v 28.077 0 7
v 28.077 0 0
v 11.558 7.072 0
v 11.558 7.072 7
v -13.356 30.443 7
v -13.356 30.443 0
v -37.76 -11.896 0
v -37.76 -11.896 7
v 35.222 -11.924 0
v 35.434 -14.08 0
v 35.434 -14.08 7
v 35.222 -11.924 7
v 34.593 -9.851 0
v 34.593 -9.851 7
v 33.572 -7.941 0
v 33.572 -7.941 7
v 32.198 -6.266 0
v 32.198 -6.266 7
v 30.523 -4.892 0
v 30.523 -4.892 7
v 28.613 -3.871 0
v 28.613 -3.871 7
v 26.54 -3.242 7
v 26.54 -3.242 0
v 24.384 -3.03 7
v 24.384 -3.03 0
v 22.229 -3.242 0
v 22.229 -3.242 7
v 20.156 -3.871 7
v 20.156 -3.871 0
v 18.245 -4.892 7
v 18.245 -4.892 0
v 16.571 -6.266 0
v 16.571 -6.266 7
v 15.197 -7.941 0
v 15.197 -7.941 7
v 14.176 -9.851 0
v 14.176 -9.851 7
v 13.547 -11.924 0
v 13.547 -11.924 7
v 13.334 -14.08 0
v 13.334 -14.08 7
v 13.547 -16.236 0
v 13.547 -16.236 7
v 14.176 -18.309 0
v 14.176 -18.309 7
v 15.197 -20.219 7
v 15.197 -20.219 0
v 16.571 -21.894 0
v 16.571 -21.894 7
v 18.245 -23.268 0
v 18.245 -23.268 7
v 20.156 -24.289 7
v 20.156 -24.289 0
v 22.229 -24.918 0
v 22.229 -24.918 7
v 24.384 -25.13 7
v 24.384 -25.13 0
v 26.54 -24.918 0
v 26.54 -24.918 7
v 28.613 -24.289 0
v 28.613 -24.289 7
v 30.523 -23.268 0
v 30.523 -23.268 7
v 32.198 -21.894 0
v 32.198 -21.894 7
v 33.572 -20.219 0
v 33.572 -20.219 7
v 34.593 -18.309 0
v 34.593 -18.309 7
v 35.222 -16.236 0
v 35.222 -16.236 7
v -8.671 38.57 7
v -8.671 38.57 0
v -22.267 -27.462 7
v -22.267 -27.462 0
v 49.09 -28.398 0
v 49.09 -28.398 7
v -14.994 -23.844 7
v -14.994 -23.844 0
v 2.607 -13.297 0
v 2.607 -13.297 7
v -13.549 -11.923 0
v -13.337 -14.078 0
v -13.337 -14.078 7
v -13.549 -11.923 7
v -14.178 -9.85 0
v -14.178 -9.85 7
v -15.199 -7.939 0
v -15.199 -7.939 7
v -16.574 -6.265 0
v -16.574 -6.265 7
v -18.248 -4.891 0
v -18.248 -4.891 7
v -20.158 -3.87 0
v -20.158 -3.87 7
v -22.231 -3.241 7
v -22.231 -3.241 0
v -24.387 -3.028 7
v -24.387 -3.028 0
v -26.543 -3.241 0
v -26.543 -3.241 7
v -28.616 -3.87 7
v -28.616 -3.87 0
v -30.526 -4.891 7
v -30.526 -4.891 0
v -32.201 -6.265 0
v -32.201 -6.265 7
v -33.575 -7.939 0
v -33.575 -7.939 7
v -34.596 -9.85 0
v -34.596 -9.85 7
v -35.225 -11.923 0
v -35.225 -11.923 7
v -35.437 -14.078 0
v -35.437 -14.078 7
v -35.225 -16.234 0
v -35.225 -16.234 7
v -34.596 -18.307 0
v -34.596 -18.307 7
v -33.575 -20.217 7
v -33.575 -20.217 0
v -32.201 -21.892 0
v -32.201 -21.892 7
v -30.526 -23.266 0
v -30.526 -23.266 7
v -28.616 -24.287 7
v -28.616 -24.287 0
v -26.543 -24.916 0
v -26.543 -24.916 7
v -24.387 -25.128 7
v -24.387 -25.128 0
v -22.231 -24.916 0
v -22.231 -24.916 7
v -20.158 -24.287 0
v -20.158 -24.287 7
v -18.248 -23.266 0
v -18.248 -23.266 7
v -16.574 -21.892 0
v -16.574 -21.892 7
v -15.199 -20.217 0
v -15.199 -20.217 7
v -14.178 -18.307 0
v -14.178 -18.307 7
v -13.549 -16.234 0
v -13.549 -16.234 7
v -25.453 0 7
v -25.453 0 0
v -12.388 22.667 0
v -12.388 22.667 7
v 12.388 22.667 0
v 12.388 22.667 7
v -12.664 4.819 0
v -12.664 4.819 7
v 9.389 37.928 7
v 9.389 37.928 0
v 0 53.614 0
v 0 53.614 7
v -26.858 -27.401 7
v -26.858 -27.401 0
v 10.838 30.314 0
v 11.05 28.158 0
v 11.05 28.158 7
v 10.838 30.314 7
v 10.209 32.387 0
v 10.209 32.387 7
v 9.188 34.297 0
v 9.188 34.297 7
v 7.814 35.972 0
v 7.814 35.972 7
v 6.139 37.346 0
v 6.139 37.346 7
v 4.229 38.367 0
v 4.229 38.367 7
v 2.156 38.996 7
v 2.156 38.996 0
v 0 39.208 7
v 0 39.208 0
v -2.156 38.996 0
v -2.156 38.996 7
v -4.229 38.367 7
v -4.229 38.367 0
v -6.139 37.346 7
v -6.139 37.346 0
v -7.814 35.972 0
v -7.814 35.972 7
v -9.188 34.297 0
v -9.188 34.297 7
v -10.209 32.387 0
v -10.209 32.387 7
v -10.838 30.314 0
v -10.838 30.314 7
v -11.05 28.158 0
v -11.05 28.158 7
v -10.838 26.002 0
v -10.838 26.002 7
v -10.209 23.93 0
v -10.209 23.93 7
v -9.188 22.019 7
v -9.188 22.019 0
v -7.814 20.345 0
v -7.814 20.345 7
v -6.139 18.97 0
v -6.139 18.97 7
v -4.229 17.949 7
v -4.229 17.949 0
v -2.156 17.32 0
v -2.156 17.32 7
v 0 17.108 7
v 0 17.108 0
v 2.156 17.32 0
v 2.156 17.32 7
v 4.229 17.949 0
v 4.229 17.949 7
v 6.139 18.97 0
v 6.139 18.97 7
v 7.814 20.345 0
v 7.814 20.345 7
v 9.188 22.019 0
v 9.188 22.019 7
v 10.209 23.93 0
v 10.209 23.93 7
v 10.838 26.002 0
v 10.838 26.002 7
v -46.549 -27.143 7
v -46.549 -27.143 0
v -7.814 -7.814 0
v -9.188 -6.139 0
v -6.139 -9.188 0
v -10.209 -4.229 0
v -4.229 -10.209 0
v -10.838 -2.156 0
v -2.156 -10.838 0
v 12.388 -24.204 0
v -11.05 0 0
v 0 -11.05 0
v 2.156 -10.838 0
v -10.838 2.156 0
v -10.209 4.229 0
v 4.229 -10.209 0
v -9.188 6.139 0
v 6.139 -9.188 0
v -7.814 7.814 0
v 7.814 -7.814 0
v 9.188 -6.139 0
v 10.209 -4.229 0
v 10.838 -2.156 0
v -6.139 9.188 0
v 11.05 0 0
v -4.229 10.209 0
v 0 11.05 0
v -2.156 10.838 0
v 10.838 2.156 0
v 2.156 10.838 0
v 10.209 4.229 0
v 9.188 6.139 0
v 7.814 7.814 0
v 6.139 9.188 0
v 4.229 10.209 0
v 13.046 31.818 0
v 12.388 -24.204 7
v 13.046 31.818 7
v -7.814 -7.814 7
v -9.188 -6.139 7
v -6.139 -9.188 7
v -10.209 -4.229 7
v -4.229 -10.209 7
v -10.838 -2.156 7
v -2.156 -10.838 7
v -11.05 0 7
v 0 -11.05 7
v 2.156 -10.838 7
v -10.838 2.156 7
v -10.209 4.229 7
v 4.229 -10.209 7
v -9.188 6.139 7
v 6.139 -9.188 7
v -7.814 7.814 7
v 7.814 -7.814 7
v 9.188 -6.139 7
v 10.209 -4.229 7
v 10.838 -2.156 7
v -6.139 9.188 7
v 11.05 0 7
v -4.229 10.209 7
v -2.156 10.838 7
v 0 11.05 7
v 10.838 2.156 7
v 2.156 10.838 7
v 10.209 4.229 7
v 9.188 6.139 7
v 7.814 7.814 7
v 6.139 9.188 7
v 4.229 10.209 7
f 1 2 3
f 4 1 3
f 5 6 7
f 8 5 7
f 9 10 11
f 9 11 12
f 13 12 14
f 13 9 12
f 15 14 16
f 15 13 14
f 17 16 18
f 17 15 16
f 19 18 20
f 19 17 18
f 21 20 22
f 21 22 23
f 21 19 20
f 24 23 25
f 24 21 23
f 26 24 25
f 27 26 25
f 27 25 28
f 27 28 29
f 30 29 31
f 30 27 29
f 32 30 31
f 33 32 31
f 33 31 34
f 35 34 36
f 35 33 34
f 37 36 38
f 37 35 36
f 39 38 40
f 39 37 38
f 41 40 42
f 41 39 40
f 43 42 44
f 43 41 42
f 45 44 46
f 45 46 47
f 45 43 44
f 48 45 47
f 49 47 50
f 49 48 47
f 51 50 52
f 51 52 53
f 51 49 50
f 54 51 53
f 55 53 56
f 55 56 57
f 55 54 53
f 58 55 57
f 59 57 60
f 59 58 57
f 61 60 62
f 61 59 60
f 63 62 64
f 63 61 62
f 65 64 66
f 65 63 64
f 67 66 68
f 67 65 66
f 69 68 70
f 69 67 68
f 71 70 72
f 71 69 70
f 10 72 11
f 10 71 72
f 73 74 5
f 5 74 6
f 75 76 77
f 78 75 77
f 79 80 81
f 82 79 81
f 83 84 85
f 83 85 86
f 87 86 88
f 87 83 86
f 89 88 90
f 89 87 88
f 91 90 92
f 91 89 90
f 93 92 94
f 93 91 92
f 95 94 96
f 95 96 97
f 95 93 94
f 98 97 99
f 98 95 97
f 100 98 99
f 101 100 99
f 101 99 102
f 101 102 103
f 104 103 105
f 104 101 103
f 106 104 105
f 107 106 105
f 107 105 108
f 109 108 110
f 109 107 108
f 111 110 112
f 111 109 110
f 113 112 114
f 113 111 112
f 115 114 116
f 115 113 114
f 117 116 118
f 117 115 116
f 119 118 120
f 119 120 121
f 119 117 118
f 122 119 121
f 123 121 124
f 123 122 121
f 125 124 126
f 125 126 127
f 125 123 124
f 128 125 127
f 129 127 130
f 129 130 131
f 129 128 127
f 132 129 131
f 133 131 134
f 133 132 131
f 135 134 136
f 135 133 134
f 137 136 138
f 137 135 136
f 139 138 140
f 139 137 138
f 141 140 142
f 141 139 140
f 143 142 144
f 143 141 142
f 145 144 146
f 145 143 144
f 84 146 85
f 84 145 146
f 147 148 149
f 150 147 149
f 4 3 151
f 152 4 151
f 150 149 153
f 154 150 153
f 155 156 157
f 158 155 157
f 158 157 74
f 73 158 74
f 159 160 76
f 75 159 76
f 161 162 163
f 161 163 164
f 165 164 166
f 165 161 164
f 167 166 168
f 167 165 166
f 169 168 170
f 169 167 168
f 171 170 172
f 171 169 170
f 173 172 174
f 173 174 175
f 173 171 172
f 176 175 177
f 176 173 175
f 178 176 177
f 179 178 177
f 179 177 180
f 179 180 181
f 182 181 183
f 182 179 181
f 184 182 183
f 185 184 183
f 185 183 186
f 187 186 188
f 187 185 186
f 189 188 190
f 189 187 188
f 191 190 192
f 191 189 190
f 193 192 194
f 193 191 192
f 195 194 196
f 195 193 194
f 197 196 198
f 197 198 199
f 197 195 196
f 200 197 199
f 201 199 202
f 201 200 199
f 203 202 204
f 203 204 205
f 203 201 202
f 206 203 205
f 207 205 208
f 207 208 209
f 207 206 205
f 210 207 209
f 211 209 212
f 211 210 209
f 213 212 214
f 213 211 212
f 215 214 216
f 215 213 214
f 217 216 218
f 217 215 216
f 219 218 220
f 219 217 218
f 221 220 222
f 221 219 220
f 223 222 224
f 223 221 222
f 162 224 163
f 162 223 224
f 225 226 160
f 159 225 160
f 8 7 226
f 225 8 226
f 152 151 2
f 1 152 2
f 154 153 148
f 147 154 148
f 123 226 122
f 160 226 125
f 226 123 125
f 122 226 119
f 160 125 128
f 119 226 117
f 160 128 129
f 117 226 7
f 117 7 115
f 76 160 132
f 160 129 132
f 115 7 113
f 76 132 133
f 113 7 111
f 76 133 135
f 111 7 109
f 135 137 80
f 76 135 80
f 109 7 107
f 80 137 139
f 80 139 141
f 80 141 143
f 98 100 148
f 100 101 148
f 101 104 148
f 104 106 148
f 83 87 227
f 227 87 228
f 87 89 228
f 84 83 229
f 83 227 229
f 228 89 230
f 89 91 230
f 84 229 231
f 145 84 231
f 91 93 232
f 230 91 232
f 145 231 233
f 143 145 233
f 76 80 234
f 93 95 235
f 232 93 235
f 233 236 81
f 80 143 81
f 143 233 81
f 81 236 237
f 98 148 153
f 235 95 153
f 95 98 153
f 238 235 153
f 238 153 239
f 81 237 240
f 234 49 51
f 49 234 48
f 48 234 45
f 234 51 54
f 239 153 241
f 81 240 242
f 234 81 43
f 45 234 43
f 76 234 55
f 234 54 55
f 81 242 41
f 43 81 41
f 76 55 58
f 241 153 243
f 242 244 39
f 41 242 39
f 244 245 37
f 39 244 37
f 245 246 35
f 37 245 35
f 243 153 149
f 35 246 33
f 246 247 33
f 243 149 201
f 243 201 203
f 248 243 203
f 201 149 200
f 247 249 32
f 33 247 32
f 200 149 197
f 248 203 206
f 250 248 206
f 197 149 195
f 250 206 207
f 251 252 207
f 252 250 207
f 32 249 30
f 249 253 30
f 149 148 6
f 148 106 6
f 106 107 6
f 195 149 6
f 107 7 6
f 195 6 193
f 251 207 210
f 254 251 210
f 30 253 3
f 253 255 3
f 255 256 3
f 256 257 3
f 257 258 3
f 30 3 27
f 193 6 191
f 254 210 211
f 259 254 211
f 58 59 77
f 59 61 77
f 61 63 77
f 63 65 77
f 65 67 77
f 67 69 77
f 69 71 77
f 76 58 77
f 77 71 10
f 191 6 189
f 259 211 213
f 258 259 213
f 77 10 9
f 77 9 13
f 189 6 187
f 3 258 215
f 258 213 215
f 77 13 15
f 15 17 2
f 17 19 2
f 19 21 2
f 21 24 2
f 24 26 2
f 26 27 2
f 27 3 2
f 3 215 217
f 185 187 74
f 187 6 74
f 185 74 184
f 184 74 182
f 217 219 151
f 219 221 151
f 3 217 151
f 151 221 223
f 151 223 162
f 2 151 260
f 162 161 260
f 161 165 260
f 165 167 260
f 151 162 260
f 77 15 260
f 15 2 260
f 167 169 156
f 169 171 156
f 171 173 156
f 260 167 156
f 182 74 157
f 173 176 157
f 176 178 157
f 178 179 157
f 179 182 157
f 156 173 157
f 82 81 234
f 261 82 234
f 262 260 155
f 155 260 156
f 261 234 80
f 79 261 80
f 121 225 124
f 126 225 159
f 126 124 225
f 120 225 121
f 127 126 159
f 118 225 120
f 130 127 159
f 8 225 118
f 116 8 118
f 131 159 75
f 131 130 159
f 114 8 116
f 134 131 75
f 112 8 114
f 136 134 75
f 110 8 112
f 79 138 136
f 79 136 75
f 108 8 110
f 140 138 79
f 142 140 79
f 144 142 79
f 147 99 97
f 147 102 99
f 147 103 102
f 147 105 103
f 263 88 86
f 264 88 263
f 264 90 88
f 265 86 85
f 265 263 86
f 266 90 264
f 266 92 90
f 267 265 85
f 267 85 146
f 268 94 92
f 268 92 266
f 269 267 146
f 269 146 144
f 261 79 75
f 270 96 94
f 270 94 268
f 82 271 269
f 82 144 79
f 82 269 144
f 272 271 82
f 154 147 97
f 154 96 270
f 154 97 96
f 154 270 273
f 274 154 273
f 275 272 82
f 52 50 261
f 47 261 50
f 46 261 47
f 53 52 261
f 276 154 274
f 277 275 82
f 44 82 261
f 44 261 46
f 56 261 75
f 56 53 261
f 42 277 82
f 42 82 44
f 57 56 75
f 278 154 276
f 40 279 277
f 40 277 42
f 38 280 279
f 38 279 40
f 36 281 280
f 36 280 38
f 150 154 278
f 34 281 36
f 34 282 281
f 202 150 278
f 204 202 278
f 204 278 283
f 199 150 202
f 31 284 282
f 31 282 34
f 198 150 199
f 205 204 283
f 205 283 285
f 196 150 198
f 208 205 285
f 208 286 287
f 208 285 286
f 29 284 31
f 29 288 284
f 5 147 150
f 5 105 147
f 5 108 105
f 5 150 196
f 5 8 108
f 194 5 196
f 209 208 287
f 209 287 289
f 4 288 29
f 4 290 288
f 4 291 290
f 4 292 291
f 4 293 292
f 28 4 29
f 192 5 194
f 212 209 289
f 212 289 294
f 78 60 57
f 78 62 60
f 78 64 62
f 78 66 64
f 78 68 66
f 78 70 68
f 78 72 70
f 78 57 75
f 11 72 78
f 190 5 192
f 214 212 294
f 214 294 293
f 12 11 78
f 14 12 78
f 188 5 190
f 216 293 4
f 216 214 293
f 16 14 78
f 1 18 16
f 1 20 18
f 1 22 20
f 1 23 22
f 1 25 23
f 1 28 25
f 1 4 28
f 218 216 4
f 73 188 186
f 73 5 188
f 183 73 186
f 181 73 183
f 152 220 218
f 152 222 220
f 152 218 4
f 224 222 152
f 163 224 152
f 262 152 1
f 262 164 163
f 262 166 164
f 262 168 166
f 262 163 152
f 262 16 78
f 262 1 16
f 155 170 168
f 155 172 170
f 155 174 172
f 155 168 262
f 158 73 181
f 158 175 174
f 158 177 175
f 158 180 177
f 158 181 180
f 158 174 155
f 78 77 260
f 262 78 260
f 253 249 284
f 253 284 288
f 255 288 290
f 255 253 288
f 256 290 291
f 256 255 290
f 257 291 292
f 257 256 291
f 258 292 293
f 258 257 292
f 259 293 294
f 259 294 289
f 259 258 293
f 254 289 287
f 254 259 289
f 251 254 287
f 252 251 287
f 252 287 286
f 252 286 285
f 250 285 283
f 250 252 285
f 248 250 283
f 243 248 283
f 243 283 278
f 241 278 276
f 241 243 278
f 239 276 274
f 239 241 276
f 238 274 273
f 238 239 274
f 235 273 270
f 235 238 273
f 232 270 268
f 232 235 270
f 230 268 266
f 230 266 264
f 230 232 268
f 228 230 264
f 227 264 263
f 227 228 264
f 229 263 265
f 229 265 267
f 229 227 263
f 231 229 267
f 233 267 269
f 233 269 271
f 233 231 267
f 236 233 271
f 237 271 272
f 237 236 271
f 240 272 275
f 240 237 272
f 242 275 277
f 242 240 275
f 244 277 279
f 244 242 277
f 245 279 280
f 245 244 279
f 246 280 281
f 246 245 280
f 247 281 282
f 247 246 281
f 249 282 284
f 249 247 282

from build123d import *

# Parameters (mm, degrees)
F0_R     = 11.05
F0_R_2   = 13.55
F1_DEPTH = 7


with BuildPart() as f1:
    # F0 (on Top) → F1 (new body)
    with BuildSketch(Plane.XY):
        with BuildLine():
            ThreePointArc((2.6065338711, -13.2969350295), (10.4623380263, -8.6105739079), (13.55, 0))
            ThreePointArc((13.55, 0), (13.0425271945, 3.6735520114), (11.5581203867, 7.0719412559))
            ThreePointArc((11.5581203867, 7.0719412559), (-1.2547280417, 13.4917811108), (-12.6639989198, 4.8192978077))
            ThreePointArc((-12.6639989198, 4.8192978077), (-10.3603872444, -8.7329763624), (2.6065338711, -13.2969350295))
        make_face()
        Circle(F0_R, mode=Mode.SUBTRACT)
        with BuildLine():
            ThreePointArc((11.5581203867, 7.0719412559), (13.0425271945, 3.6735520114), (13.55, 0))
            ThreePointArc((13.55, 0), (10.4623380263, -8.6105739079), (2.6065338711, -13.2969350295))
            Line((2.6065338711, -13.2969350295), (12.3875978298, -24.2038302976))
            Line((12.3875978298, -24.2038302976), (-14.9941514566, -23.8444135863))
            ThreePointArc((-14.9941514566, -23.8444135863), (-18.3532690256, -26.2108119603), (-22.267239092, -27.461551912))
            Line((-22.267239092, -27.461551912), (49.0895092572, -28.3981906763))
            Line((49.0895092572, -28.3981906763), (13.0464962981, 31.8175852156))
            ThreePointArc((13.0464962981, 31.8175852156), (13.4235339021, 30.0051079331), (13.55, 28.1581543386))
            ThreePointArc((13.55, 28.1581543386), (13.2562145915, 25.351862354), (12.3875978298, 22.6672600574))
            Line((12.3875978298, 22.6672600574), (28.0773907901, 0))
            Line((28.0773907901, 0), (11.5581203867, 7.0719412559))
        make_face()
        with Locations((24.3843801233, -14.0799748264)):
            Circle(F0_R_2, mode=Mode.SUBTRACT)
        with BuildLine():
            ThreePointArc((-12.6639989198, 4.8192978077), (-1.2547280417, 13.4917811108), (11.5581203867, 7.0719412559))
            Line((11.5581203867, 7.0719412559), (12.3875978298, 22.6672600574))
            ThreePointArc((12.3875978298, 22.6672600574), (0, 14.6081543386), (-12.3875978298, 22.6672600574))
            Line((-12.3875978298, 22.6672600574), (-12.6639989198, 4.8192978077))
        make_face()
        with BuildLine():
            Line((-14.9941514566, -23.8444135863), (2.6065338711, -13.2969350295))
            ThreePointArc((2.6065338711, -13.2969350295), (-10.3603872444, -8.7329763624), (-12.6639989198, 4.8192978077))
            Line((-12.6639989198, 4.8192978077), (-25.4531481717, 0))
            Line((-25.4531481717, 0), (-12.3875978298, 22.6672600574))
            ThreePointArc((-12.3875978298, 22.6672600574), (-13.4461101823, 26.4834540771), (-13.3560221409, 30.4427051857))
            Line((-13.3560221409, 30.4427051857), (-32.9787461707, -3.600513583))
            ThreePointArc((-32.9787461707, -3.600513583), (-18.5911674875, -1.8305608799), (-10.8371028035, -14.0784028862))
            ThreePointArc((-10.8371028035, -14.0784028862), (-11.9196052449, -19.3853798623), (-14.9941514566, -23.8444135863))
        make_face()
        with BuildLine():
            ThreePointArc((-12.3875978298, 22.6672600574), (0, 14.6081543386), (12.3875978298, 22.6672600574))
            ThreePointArc((12.3875978298, 22.6672600574), (13.2562145915, 25.351862354), (13.55, 28.1581543386))
            ThreePointArc((13.55, 28.1581543386), (13.4235339021, 30.0051079331), (13.0464962981, 31.8175852156))
            Line((13.0464962981, 31.8175852156), (9.3890984881, 37.9278692567))
            ThreePointArc((9.3890984881, 37.9278692567), (0.4816570964, 41.6995909847), (-8.6712487219, 38.5702600624))
            Line((-8.6712487219, 38.5702600624), (-13.3560221409, 30.4427051857))
            ThreePointArc((-13.3560221409, 30.4427051857), (-13.4461101823, 26.4834540771), (-12.3875978298, 22.6672600574))
        make_face()
        with Locations((0, 28.1581543386)):
            Circle(F0_R, mode=Mode.SUBTRACT)
        with BuildLine():
            ThreePointArc((-22.267239092, -27.461551912), (-18.3532690256, -26.2108119603), (-14.9941514566, -23.8444135863))
            ThreePointArc((-14.9941514566, -23.8444135863), (-11.9196052449, -19.3853798623), (-10.8371028035, -14.0784028862))
            ThreePointArc((-10.8371028035, -14.0784028862), (-18.5911674875, -1.8305608799), (-32.9787461707, -3.600513583))
            Line((-32.9787461707, -3.600513583), (-37.7601482446, -11.895708306))
            ThreePointArc((-37.7601482446, -11.895708306), (-35.4713085242, -21.872174986), (-26.8575138424, -27.4012993168))
            Line((-26.8575138424, -27.4012993168), (-22.267239092, -27.461551912))
        make_face()
        with Locations((-24.3871028035, -14.0784028862)):
            Circle(F0_R, mode=Mode.SUBTRACT)
        with BuildLine():
            Line((-46.5486845968, -27.1428302263), (-26.8575138424, -27.4012993168))
            ThreePointArc((-26.8575138424, -27.4012993168), (-35.4713085242, -21.872174986), (-37.7601482446, -11.895708306))
            Line((-37.7601482446, -11.895708306), (-46.5486845968, -27.1428302263))
        make_face()
        with BuildLine():
            Line((0, 53.6139011383), (-8.6712487219, 38.5702600624))
            ThreePointArc((-8.6712487219, 38.5702600624), (0.4816570964, 41.6995909847), (9.3890984881, 37.9278692567))
            Line((9.3890984881, 37.9278692567), (0, 53.6139011383))
        make_face()
        with Locations((24.3843801233, -14.0799748264)):
            Circle(F0_R_2)
        with Locations((24.3843801233, -14.0799748264)):
            Circle(F0_R, mode=Mode.SUBTRACT)
    extrude(amount=F1_DEPTH)


solid = f1.part
